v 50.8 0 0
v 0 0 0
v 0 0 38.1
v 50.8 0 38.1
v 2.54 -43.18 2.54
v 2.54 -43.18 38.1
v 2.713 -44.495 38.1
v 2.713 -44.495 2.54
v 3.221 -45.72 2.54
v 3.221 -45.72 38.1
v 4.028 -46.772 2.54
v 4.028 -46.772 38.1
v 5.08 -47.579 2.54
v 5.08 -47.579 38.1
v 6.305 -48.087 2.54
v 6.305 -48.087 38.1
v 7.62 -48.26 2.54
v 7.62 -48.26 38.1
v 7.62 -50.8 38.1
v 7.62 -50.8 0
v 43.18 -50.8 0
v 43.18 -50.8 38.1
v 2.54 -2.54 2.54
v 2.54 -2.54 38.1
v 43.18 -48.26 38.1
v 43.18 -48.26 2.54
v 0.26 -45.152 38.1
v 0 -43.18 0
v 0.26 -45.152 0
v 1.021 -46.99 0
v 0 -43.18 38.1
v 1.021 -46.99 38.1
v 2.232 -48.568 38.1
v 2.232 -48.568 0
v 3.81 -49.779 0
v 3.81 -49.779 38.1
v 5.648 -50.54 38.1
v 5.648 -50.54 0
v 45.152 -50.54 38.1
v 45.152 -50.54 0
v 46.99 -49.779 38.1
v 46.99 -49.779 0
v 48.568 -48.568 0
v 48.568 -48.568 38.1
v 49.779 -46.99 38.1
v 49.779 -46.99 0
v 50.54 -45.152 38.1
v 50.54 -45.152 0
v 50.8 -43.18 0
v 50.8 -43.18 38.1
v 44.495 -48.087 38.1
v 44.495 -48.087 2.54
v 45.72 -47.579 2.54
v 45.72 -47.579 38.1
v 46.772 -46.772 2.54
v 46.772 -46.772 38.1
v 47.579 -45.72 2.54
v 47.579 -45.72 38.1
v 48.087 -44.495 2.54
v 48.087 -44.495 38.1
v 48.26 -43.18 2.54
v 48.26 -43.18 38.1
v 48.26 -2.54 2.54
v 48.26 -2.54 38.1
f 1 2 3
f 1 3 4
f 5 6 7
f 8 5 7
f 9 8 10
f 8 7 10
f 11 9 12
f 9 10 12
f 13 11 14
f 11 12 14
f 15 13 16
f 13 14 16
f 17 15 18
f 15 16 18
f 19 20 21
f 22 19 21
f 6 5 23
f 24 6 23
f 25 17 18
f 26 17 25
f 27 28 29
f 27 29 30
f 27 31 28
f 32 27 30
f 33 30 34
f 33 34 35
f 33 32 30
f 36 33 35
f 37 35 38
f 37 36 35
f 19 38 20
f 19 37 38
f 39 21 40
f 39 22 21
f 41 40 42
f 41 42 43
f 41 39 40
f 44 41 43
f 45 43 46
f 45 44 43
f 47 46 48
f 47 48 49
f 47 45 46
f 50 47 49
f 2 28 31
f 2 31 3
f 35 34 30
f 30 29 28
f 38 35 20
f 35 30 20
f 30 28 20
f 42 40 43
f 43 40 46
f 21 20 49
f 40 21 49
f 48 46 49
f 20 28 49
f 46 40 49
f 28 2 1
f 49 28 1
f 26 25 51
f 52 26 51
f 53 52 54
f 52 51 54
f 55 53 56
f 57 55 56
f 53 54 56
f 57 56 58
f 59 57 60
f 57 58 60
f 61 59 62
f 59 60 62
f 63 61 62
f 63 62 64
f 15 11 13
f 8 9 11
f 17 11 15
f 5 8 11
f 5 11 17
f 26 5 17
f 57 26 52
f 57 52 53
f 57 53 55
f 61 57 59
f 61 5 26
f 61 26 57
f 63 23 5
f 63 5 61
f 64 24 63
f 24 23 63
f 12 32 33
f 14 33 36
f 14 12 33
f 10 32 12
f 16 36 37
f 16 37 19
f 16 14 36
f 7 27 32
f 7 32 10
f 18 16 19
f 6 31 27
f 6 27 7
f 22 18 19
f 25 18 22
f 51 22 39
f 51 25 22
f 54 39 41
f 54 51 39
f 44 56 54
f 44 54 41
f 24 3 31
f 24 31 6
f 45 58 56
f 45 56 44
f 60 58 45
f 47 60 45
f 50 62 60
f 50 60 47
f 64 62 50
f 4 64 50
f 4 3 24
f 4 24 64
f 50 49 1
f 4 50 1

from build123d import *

# Parameters (mm, degrees)
F0_W     = 50.8
F0_H     = 50.8
F1_DEPTH = 38.1
F2_R     = 7.62
F3_T     = -2.54


with BuildPart() as f1:
    # F0 (on Top) → F1 (new body)
    with BuildSketch(Plane.XY):
        with Locations((25.4, -25.4)):
            Rectangle(F0_W, F0_H)
    extrude(amount=F1_DEPTH)

    # F2
    f2_edges = [f1.edges().sort_by_distance(p)[0] for p in [
        (50.8, -50.8, 19.05),
        (0, -50.8, 19.05),
    ]]
    fillet(f2_edges, radius=F2_R)

    # F3
    f3_openings = [f1.faces().sort_by_distance(p)[0] for p in [
        (25.4, -25.168915, 38.1),
    ]]
    offset(amount=F3_T, openings=f3_openings)


solid = f1.part
